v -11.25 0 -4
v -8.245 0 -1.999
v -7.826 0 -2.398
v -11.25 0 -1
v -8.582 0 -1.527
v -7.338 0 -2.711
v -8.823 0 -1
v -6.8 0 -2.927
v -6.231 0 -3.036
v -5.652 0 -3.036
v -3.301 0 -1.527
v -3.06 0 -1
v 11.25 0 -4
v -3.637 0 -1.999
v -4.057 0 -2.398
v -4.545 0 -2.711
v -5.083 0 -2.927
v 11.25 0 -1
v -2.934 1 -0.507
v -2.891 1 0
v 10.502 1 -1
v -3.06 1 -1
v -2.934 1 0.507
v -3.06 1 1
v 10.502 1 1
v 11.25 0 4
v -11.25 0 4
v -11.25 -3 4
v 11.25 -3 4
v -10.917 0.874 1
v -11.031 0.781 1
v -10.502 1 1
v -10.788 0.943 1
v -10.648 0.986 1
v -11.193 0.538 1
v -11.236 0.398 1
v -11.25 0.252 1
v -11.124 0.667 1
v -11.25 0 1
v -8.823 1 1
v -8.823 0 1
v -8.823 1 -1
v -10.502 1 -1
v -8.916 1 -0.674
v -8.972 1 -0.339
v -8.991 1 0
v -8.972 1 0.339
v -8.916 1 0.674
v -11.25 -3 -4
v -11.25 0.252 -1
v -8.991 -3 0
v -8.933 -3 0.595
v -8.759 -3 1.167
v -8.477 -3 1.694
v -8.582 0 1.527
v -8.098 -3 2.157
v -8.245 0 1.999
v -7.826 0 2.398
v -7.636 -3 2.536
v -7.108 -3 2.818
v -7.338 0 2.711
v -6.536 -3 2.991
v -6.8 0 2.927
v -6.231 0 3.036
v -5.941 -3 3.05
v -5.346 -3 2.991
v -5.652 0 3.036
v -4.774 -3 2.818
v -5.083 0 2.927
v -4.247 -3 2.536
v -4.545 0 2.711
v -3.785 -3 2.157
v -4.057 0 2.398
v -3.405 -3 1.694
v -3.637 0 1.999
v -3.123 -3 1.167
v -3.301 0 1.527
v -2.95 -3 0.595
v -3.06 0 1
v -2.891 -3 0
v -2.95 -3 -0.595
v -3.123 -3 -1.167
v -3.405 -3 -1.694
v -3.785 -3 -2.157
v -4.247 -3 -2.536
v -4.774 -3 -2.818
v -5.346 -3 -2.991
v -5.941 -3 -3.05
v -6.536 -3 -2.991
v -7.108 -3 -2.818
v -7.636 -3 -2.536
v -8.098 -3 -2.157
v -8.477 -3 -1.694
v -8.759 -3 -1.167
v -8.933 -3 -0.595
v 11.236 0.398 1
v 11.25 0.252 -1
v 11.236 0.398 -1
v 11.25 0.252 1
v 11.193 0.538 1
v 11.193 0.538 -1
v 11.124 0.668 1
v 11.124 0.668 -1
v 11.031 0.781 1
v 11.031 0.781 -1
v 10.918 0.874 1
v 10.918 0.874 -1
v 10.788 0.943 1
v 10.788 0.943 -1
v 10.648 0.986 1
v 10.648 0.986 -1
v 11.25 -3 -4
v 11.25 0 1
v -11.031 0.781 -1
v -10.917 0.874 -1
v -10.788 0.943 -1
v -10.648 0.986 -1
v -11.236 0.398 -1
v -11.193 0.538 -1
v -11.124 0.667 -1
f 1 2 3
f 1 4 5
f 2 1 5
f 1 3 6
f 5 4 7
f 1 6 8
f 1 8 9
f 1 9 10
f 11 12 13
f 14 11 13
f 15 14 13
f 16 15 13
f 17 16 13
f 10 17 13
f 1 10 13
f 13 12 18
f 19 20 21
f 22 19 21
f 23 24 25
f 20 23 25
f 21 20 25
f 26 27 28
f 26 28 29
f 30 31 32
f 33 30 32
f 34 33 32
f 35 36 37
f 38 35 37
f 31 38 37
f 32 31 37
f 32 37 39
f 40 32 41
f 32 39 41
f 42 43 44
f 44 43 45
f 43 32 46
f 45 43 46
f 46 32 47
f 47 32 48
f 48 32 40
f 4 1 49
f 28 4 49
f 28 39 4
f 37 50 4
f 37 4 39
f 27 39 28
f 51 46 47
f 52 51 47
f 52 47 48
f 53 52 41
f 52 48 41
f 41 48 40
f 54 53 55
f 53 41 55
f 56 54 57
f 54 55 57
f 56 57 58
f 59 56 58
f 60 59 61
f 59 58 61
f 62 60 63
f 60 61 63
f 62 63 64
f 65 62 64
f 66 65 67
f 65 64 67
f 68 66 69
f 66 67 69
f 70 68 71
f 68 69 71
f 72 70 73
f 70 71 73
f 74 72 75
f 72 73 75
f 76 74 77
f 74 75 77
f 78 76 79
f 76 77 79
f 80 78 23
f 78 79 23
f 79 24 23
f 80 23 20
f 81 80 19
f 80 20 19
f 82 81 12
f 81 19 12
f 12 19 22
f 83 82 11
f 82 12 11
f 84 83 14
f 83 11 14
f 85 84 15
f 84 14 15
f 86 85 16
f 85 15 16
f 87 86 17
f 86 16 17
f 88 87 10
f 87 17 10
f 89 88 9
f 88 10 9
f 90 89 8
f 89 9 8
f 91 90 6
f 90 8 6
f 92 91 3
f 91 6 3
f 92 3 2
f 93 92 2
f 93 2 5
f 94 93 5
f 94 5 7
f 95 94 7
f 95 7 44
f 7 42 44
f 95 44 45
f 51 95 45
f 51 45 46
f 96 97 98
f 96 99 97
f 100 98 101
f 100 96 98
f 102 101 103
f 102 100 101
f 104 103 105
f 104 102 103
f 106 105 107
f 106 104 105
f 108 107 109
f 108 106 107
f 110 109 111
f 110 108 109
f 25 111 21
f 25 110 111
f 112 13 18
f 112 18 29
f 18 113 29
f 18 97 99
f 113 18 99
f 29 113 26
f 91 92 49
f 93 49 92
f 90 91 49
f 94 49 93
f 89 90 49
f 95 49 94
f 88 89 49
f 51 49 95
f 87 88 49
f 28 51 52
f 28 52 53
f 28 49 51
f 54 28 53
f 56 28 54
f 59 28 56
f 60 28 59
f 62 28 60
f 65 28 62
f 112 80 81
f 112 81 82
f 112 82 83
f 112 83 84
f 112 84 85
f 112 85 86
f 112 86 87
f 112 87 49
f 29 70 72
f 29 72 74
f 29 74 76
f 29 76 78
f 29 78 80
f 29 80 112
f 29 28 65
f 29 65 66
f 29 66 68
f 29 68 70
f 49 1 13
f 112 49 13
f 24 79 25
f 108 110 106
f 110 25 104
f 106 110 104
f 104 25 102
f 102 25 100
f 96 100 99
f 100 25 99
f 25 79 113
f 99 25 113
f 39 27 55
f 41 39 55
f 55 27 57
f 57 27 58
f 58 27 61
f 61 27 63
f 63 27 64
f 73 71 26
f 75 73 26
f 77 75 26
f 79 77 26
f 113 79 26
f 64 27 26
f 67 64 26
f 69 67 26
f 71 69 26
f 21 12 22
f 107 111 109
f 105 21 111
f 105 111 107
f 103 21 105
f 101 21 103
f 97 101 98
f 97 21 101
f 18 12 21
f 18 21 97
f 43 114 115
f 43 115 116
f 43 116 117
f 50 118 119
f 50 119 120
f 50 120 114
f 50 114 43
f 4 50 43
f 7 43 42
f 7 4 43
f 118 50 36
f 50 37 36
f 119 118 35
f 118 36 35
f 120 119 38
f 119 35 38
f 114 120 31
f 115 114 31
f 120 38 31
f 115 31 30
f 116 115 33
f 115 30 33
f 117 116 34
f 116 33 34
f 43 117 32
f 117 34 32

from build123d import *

# Parameters (mm, degrees)
F0_W     = 22.5
F0_H     = 8
F2_DEPTH = 3
F1_W     = 22.5
F1_H     = 2
F3_DEPTH = 1
F5_D     = 6.1
F6_R     = 0.748406
F7_R     = 0.748


with BuildPart() as f2:
    # F0 (on Front) → F2 (new body)
    with BuildSketch(Plane.XZ):
        Rectangle(F0_W, F0_H)
    extrude(amount=F2_DEPTH)

    # F1 (on Front) → F3 (join)
    with BuildSketch(Plane.XZ):
        Rectangle(F1_W, F1_H)
    extrude(amount=-F3_DEPTH)

    # F5 (through all)
    with Locations(Plane.XZ.offset(3)):
        with Locations((-5.941246, 0)):
            Hole(F5_D / 2)

    # F6
    f6_edges = [f2.edges().sort_by_distance(p)[0] for p in [
        (-11.25, 1, 0),
    ]]
    fillet(f6_edges, radius=F6_R)

    # F7
    f7_edges = [f2.edges().sort_by_distance(p)[0] for p in [
        (11.25, 1, 0),
    ]]
    fillet(f7_edges, radius=F7_R)


solid = f2.part
